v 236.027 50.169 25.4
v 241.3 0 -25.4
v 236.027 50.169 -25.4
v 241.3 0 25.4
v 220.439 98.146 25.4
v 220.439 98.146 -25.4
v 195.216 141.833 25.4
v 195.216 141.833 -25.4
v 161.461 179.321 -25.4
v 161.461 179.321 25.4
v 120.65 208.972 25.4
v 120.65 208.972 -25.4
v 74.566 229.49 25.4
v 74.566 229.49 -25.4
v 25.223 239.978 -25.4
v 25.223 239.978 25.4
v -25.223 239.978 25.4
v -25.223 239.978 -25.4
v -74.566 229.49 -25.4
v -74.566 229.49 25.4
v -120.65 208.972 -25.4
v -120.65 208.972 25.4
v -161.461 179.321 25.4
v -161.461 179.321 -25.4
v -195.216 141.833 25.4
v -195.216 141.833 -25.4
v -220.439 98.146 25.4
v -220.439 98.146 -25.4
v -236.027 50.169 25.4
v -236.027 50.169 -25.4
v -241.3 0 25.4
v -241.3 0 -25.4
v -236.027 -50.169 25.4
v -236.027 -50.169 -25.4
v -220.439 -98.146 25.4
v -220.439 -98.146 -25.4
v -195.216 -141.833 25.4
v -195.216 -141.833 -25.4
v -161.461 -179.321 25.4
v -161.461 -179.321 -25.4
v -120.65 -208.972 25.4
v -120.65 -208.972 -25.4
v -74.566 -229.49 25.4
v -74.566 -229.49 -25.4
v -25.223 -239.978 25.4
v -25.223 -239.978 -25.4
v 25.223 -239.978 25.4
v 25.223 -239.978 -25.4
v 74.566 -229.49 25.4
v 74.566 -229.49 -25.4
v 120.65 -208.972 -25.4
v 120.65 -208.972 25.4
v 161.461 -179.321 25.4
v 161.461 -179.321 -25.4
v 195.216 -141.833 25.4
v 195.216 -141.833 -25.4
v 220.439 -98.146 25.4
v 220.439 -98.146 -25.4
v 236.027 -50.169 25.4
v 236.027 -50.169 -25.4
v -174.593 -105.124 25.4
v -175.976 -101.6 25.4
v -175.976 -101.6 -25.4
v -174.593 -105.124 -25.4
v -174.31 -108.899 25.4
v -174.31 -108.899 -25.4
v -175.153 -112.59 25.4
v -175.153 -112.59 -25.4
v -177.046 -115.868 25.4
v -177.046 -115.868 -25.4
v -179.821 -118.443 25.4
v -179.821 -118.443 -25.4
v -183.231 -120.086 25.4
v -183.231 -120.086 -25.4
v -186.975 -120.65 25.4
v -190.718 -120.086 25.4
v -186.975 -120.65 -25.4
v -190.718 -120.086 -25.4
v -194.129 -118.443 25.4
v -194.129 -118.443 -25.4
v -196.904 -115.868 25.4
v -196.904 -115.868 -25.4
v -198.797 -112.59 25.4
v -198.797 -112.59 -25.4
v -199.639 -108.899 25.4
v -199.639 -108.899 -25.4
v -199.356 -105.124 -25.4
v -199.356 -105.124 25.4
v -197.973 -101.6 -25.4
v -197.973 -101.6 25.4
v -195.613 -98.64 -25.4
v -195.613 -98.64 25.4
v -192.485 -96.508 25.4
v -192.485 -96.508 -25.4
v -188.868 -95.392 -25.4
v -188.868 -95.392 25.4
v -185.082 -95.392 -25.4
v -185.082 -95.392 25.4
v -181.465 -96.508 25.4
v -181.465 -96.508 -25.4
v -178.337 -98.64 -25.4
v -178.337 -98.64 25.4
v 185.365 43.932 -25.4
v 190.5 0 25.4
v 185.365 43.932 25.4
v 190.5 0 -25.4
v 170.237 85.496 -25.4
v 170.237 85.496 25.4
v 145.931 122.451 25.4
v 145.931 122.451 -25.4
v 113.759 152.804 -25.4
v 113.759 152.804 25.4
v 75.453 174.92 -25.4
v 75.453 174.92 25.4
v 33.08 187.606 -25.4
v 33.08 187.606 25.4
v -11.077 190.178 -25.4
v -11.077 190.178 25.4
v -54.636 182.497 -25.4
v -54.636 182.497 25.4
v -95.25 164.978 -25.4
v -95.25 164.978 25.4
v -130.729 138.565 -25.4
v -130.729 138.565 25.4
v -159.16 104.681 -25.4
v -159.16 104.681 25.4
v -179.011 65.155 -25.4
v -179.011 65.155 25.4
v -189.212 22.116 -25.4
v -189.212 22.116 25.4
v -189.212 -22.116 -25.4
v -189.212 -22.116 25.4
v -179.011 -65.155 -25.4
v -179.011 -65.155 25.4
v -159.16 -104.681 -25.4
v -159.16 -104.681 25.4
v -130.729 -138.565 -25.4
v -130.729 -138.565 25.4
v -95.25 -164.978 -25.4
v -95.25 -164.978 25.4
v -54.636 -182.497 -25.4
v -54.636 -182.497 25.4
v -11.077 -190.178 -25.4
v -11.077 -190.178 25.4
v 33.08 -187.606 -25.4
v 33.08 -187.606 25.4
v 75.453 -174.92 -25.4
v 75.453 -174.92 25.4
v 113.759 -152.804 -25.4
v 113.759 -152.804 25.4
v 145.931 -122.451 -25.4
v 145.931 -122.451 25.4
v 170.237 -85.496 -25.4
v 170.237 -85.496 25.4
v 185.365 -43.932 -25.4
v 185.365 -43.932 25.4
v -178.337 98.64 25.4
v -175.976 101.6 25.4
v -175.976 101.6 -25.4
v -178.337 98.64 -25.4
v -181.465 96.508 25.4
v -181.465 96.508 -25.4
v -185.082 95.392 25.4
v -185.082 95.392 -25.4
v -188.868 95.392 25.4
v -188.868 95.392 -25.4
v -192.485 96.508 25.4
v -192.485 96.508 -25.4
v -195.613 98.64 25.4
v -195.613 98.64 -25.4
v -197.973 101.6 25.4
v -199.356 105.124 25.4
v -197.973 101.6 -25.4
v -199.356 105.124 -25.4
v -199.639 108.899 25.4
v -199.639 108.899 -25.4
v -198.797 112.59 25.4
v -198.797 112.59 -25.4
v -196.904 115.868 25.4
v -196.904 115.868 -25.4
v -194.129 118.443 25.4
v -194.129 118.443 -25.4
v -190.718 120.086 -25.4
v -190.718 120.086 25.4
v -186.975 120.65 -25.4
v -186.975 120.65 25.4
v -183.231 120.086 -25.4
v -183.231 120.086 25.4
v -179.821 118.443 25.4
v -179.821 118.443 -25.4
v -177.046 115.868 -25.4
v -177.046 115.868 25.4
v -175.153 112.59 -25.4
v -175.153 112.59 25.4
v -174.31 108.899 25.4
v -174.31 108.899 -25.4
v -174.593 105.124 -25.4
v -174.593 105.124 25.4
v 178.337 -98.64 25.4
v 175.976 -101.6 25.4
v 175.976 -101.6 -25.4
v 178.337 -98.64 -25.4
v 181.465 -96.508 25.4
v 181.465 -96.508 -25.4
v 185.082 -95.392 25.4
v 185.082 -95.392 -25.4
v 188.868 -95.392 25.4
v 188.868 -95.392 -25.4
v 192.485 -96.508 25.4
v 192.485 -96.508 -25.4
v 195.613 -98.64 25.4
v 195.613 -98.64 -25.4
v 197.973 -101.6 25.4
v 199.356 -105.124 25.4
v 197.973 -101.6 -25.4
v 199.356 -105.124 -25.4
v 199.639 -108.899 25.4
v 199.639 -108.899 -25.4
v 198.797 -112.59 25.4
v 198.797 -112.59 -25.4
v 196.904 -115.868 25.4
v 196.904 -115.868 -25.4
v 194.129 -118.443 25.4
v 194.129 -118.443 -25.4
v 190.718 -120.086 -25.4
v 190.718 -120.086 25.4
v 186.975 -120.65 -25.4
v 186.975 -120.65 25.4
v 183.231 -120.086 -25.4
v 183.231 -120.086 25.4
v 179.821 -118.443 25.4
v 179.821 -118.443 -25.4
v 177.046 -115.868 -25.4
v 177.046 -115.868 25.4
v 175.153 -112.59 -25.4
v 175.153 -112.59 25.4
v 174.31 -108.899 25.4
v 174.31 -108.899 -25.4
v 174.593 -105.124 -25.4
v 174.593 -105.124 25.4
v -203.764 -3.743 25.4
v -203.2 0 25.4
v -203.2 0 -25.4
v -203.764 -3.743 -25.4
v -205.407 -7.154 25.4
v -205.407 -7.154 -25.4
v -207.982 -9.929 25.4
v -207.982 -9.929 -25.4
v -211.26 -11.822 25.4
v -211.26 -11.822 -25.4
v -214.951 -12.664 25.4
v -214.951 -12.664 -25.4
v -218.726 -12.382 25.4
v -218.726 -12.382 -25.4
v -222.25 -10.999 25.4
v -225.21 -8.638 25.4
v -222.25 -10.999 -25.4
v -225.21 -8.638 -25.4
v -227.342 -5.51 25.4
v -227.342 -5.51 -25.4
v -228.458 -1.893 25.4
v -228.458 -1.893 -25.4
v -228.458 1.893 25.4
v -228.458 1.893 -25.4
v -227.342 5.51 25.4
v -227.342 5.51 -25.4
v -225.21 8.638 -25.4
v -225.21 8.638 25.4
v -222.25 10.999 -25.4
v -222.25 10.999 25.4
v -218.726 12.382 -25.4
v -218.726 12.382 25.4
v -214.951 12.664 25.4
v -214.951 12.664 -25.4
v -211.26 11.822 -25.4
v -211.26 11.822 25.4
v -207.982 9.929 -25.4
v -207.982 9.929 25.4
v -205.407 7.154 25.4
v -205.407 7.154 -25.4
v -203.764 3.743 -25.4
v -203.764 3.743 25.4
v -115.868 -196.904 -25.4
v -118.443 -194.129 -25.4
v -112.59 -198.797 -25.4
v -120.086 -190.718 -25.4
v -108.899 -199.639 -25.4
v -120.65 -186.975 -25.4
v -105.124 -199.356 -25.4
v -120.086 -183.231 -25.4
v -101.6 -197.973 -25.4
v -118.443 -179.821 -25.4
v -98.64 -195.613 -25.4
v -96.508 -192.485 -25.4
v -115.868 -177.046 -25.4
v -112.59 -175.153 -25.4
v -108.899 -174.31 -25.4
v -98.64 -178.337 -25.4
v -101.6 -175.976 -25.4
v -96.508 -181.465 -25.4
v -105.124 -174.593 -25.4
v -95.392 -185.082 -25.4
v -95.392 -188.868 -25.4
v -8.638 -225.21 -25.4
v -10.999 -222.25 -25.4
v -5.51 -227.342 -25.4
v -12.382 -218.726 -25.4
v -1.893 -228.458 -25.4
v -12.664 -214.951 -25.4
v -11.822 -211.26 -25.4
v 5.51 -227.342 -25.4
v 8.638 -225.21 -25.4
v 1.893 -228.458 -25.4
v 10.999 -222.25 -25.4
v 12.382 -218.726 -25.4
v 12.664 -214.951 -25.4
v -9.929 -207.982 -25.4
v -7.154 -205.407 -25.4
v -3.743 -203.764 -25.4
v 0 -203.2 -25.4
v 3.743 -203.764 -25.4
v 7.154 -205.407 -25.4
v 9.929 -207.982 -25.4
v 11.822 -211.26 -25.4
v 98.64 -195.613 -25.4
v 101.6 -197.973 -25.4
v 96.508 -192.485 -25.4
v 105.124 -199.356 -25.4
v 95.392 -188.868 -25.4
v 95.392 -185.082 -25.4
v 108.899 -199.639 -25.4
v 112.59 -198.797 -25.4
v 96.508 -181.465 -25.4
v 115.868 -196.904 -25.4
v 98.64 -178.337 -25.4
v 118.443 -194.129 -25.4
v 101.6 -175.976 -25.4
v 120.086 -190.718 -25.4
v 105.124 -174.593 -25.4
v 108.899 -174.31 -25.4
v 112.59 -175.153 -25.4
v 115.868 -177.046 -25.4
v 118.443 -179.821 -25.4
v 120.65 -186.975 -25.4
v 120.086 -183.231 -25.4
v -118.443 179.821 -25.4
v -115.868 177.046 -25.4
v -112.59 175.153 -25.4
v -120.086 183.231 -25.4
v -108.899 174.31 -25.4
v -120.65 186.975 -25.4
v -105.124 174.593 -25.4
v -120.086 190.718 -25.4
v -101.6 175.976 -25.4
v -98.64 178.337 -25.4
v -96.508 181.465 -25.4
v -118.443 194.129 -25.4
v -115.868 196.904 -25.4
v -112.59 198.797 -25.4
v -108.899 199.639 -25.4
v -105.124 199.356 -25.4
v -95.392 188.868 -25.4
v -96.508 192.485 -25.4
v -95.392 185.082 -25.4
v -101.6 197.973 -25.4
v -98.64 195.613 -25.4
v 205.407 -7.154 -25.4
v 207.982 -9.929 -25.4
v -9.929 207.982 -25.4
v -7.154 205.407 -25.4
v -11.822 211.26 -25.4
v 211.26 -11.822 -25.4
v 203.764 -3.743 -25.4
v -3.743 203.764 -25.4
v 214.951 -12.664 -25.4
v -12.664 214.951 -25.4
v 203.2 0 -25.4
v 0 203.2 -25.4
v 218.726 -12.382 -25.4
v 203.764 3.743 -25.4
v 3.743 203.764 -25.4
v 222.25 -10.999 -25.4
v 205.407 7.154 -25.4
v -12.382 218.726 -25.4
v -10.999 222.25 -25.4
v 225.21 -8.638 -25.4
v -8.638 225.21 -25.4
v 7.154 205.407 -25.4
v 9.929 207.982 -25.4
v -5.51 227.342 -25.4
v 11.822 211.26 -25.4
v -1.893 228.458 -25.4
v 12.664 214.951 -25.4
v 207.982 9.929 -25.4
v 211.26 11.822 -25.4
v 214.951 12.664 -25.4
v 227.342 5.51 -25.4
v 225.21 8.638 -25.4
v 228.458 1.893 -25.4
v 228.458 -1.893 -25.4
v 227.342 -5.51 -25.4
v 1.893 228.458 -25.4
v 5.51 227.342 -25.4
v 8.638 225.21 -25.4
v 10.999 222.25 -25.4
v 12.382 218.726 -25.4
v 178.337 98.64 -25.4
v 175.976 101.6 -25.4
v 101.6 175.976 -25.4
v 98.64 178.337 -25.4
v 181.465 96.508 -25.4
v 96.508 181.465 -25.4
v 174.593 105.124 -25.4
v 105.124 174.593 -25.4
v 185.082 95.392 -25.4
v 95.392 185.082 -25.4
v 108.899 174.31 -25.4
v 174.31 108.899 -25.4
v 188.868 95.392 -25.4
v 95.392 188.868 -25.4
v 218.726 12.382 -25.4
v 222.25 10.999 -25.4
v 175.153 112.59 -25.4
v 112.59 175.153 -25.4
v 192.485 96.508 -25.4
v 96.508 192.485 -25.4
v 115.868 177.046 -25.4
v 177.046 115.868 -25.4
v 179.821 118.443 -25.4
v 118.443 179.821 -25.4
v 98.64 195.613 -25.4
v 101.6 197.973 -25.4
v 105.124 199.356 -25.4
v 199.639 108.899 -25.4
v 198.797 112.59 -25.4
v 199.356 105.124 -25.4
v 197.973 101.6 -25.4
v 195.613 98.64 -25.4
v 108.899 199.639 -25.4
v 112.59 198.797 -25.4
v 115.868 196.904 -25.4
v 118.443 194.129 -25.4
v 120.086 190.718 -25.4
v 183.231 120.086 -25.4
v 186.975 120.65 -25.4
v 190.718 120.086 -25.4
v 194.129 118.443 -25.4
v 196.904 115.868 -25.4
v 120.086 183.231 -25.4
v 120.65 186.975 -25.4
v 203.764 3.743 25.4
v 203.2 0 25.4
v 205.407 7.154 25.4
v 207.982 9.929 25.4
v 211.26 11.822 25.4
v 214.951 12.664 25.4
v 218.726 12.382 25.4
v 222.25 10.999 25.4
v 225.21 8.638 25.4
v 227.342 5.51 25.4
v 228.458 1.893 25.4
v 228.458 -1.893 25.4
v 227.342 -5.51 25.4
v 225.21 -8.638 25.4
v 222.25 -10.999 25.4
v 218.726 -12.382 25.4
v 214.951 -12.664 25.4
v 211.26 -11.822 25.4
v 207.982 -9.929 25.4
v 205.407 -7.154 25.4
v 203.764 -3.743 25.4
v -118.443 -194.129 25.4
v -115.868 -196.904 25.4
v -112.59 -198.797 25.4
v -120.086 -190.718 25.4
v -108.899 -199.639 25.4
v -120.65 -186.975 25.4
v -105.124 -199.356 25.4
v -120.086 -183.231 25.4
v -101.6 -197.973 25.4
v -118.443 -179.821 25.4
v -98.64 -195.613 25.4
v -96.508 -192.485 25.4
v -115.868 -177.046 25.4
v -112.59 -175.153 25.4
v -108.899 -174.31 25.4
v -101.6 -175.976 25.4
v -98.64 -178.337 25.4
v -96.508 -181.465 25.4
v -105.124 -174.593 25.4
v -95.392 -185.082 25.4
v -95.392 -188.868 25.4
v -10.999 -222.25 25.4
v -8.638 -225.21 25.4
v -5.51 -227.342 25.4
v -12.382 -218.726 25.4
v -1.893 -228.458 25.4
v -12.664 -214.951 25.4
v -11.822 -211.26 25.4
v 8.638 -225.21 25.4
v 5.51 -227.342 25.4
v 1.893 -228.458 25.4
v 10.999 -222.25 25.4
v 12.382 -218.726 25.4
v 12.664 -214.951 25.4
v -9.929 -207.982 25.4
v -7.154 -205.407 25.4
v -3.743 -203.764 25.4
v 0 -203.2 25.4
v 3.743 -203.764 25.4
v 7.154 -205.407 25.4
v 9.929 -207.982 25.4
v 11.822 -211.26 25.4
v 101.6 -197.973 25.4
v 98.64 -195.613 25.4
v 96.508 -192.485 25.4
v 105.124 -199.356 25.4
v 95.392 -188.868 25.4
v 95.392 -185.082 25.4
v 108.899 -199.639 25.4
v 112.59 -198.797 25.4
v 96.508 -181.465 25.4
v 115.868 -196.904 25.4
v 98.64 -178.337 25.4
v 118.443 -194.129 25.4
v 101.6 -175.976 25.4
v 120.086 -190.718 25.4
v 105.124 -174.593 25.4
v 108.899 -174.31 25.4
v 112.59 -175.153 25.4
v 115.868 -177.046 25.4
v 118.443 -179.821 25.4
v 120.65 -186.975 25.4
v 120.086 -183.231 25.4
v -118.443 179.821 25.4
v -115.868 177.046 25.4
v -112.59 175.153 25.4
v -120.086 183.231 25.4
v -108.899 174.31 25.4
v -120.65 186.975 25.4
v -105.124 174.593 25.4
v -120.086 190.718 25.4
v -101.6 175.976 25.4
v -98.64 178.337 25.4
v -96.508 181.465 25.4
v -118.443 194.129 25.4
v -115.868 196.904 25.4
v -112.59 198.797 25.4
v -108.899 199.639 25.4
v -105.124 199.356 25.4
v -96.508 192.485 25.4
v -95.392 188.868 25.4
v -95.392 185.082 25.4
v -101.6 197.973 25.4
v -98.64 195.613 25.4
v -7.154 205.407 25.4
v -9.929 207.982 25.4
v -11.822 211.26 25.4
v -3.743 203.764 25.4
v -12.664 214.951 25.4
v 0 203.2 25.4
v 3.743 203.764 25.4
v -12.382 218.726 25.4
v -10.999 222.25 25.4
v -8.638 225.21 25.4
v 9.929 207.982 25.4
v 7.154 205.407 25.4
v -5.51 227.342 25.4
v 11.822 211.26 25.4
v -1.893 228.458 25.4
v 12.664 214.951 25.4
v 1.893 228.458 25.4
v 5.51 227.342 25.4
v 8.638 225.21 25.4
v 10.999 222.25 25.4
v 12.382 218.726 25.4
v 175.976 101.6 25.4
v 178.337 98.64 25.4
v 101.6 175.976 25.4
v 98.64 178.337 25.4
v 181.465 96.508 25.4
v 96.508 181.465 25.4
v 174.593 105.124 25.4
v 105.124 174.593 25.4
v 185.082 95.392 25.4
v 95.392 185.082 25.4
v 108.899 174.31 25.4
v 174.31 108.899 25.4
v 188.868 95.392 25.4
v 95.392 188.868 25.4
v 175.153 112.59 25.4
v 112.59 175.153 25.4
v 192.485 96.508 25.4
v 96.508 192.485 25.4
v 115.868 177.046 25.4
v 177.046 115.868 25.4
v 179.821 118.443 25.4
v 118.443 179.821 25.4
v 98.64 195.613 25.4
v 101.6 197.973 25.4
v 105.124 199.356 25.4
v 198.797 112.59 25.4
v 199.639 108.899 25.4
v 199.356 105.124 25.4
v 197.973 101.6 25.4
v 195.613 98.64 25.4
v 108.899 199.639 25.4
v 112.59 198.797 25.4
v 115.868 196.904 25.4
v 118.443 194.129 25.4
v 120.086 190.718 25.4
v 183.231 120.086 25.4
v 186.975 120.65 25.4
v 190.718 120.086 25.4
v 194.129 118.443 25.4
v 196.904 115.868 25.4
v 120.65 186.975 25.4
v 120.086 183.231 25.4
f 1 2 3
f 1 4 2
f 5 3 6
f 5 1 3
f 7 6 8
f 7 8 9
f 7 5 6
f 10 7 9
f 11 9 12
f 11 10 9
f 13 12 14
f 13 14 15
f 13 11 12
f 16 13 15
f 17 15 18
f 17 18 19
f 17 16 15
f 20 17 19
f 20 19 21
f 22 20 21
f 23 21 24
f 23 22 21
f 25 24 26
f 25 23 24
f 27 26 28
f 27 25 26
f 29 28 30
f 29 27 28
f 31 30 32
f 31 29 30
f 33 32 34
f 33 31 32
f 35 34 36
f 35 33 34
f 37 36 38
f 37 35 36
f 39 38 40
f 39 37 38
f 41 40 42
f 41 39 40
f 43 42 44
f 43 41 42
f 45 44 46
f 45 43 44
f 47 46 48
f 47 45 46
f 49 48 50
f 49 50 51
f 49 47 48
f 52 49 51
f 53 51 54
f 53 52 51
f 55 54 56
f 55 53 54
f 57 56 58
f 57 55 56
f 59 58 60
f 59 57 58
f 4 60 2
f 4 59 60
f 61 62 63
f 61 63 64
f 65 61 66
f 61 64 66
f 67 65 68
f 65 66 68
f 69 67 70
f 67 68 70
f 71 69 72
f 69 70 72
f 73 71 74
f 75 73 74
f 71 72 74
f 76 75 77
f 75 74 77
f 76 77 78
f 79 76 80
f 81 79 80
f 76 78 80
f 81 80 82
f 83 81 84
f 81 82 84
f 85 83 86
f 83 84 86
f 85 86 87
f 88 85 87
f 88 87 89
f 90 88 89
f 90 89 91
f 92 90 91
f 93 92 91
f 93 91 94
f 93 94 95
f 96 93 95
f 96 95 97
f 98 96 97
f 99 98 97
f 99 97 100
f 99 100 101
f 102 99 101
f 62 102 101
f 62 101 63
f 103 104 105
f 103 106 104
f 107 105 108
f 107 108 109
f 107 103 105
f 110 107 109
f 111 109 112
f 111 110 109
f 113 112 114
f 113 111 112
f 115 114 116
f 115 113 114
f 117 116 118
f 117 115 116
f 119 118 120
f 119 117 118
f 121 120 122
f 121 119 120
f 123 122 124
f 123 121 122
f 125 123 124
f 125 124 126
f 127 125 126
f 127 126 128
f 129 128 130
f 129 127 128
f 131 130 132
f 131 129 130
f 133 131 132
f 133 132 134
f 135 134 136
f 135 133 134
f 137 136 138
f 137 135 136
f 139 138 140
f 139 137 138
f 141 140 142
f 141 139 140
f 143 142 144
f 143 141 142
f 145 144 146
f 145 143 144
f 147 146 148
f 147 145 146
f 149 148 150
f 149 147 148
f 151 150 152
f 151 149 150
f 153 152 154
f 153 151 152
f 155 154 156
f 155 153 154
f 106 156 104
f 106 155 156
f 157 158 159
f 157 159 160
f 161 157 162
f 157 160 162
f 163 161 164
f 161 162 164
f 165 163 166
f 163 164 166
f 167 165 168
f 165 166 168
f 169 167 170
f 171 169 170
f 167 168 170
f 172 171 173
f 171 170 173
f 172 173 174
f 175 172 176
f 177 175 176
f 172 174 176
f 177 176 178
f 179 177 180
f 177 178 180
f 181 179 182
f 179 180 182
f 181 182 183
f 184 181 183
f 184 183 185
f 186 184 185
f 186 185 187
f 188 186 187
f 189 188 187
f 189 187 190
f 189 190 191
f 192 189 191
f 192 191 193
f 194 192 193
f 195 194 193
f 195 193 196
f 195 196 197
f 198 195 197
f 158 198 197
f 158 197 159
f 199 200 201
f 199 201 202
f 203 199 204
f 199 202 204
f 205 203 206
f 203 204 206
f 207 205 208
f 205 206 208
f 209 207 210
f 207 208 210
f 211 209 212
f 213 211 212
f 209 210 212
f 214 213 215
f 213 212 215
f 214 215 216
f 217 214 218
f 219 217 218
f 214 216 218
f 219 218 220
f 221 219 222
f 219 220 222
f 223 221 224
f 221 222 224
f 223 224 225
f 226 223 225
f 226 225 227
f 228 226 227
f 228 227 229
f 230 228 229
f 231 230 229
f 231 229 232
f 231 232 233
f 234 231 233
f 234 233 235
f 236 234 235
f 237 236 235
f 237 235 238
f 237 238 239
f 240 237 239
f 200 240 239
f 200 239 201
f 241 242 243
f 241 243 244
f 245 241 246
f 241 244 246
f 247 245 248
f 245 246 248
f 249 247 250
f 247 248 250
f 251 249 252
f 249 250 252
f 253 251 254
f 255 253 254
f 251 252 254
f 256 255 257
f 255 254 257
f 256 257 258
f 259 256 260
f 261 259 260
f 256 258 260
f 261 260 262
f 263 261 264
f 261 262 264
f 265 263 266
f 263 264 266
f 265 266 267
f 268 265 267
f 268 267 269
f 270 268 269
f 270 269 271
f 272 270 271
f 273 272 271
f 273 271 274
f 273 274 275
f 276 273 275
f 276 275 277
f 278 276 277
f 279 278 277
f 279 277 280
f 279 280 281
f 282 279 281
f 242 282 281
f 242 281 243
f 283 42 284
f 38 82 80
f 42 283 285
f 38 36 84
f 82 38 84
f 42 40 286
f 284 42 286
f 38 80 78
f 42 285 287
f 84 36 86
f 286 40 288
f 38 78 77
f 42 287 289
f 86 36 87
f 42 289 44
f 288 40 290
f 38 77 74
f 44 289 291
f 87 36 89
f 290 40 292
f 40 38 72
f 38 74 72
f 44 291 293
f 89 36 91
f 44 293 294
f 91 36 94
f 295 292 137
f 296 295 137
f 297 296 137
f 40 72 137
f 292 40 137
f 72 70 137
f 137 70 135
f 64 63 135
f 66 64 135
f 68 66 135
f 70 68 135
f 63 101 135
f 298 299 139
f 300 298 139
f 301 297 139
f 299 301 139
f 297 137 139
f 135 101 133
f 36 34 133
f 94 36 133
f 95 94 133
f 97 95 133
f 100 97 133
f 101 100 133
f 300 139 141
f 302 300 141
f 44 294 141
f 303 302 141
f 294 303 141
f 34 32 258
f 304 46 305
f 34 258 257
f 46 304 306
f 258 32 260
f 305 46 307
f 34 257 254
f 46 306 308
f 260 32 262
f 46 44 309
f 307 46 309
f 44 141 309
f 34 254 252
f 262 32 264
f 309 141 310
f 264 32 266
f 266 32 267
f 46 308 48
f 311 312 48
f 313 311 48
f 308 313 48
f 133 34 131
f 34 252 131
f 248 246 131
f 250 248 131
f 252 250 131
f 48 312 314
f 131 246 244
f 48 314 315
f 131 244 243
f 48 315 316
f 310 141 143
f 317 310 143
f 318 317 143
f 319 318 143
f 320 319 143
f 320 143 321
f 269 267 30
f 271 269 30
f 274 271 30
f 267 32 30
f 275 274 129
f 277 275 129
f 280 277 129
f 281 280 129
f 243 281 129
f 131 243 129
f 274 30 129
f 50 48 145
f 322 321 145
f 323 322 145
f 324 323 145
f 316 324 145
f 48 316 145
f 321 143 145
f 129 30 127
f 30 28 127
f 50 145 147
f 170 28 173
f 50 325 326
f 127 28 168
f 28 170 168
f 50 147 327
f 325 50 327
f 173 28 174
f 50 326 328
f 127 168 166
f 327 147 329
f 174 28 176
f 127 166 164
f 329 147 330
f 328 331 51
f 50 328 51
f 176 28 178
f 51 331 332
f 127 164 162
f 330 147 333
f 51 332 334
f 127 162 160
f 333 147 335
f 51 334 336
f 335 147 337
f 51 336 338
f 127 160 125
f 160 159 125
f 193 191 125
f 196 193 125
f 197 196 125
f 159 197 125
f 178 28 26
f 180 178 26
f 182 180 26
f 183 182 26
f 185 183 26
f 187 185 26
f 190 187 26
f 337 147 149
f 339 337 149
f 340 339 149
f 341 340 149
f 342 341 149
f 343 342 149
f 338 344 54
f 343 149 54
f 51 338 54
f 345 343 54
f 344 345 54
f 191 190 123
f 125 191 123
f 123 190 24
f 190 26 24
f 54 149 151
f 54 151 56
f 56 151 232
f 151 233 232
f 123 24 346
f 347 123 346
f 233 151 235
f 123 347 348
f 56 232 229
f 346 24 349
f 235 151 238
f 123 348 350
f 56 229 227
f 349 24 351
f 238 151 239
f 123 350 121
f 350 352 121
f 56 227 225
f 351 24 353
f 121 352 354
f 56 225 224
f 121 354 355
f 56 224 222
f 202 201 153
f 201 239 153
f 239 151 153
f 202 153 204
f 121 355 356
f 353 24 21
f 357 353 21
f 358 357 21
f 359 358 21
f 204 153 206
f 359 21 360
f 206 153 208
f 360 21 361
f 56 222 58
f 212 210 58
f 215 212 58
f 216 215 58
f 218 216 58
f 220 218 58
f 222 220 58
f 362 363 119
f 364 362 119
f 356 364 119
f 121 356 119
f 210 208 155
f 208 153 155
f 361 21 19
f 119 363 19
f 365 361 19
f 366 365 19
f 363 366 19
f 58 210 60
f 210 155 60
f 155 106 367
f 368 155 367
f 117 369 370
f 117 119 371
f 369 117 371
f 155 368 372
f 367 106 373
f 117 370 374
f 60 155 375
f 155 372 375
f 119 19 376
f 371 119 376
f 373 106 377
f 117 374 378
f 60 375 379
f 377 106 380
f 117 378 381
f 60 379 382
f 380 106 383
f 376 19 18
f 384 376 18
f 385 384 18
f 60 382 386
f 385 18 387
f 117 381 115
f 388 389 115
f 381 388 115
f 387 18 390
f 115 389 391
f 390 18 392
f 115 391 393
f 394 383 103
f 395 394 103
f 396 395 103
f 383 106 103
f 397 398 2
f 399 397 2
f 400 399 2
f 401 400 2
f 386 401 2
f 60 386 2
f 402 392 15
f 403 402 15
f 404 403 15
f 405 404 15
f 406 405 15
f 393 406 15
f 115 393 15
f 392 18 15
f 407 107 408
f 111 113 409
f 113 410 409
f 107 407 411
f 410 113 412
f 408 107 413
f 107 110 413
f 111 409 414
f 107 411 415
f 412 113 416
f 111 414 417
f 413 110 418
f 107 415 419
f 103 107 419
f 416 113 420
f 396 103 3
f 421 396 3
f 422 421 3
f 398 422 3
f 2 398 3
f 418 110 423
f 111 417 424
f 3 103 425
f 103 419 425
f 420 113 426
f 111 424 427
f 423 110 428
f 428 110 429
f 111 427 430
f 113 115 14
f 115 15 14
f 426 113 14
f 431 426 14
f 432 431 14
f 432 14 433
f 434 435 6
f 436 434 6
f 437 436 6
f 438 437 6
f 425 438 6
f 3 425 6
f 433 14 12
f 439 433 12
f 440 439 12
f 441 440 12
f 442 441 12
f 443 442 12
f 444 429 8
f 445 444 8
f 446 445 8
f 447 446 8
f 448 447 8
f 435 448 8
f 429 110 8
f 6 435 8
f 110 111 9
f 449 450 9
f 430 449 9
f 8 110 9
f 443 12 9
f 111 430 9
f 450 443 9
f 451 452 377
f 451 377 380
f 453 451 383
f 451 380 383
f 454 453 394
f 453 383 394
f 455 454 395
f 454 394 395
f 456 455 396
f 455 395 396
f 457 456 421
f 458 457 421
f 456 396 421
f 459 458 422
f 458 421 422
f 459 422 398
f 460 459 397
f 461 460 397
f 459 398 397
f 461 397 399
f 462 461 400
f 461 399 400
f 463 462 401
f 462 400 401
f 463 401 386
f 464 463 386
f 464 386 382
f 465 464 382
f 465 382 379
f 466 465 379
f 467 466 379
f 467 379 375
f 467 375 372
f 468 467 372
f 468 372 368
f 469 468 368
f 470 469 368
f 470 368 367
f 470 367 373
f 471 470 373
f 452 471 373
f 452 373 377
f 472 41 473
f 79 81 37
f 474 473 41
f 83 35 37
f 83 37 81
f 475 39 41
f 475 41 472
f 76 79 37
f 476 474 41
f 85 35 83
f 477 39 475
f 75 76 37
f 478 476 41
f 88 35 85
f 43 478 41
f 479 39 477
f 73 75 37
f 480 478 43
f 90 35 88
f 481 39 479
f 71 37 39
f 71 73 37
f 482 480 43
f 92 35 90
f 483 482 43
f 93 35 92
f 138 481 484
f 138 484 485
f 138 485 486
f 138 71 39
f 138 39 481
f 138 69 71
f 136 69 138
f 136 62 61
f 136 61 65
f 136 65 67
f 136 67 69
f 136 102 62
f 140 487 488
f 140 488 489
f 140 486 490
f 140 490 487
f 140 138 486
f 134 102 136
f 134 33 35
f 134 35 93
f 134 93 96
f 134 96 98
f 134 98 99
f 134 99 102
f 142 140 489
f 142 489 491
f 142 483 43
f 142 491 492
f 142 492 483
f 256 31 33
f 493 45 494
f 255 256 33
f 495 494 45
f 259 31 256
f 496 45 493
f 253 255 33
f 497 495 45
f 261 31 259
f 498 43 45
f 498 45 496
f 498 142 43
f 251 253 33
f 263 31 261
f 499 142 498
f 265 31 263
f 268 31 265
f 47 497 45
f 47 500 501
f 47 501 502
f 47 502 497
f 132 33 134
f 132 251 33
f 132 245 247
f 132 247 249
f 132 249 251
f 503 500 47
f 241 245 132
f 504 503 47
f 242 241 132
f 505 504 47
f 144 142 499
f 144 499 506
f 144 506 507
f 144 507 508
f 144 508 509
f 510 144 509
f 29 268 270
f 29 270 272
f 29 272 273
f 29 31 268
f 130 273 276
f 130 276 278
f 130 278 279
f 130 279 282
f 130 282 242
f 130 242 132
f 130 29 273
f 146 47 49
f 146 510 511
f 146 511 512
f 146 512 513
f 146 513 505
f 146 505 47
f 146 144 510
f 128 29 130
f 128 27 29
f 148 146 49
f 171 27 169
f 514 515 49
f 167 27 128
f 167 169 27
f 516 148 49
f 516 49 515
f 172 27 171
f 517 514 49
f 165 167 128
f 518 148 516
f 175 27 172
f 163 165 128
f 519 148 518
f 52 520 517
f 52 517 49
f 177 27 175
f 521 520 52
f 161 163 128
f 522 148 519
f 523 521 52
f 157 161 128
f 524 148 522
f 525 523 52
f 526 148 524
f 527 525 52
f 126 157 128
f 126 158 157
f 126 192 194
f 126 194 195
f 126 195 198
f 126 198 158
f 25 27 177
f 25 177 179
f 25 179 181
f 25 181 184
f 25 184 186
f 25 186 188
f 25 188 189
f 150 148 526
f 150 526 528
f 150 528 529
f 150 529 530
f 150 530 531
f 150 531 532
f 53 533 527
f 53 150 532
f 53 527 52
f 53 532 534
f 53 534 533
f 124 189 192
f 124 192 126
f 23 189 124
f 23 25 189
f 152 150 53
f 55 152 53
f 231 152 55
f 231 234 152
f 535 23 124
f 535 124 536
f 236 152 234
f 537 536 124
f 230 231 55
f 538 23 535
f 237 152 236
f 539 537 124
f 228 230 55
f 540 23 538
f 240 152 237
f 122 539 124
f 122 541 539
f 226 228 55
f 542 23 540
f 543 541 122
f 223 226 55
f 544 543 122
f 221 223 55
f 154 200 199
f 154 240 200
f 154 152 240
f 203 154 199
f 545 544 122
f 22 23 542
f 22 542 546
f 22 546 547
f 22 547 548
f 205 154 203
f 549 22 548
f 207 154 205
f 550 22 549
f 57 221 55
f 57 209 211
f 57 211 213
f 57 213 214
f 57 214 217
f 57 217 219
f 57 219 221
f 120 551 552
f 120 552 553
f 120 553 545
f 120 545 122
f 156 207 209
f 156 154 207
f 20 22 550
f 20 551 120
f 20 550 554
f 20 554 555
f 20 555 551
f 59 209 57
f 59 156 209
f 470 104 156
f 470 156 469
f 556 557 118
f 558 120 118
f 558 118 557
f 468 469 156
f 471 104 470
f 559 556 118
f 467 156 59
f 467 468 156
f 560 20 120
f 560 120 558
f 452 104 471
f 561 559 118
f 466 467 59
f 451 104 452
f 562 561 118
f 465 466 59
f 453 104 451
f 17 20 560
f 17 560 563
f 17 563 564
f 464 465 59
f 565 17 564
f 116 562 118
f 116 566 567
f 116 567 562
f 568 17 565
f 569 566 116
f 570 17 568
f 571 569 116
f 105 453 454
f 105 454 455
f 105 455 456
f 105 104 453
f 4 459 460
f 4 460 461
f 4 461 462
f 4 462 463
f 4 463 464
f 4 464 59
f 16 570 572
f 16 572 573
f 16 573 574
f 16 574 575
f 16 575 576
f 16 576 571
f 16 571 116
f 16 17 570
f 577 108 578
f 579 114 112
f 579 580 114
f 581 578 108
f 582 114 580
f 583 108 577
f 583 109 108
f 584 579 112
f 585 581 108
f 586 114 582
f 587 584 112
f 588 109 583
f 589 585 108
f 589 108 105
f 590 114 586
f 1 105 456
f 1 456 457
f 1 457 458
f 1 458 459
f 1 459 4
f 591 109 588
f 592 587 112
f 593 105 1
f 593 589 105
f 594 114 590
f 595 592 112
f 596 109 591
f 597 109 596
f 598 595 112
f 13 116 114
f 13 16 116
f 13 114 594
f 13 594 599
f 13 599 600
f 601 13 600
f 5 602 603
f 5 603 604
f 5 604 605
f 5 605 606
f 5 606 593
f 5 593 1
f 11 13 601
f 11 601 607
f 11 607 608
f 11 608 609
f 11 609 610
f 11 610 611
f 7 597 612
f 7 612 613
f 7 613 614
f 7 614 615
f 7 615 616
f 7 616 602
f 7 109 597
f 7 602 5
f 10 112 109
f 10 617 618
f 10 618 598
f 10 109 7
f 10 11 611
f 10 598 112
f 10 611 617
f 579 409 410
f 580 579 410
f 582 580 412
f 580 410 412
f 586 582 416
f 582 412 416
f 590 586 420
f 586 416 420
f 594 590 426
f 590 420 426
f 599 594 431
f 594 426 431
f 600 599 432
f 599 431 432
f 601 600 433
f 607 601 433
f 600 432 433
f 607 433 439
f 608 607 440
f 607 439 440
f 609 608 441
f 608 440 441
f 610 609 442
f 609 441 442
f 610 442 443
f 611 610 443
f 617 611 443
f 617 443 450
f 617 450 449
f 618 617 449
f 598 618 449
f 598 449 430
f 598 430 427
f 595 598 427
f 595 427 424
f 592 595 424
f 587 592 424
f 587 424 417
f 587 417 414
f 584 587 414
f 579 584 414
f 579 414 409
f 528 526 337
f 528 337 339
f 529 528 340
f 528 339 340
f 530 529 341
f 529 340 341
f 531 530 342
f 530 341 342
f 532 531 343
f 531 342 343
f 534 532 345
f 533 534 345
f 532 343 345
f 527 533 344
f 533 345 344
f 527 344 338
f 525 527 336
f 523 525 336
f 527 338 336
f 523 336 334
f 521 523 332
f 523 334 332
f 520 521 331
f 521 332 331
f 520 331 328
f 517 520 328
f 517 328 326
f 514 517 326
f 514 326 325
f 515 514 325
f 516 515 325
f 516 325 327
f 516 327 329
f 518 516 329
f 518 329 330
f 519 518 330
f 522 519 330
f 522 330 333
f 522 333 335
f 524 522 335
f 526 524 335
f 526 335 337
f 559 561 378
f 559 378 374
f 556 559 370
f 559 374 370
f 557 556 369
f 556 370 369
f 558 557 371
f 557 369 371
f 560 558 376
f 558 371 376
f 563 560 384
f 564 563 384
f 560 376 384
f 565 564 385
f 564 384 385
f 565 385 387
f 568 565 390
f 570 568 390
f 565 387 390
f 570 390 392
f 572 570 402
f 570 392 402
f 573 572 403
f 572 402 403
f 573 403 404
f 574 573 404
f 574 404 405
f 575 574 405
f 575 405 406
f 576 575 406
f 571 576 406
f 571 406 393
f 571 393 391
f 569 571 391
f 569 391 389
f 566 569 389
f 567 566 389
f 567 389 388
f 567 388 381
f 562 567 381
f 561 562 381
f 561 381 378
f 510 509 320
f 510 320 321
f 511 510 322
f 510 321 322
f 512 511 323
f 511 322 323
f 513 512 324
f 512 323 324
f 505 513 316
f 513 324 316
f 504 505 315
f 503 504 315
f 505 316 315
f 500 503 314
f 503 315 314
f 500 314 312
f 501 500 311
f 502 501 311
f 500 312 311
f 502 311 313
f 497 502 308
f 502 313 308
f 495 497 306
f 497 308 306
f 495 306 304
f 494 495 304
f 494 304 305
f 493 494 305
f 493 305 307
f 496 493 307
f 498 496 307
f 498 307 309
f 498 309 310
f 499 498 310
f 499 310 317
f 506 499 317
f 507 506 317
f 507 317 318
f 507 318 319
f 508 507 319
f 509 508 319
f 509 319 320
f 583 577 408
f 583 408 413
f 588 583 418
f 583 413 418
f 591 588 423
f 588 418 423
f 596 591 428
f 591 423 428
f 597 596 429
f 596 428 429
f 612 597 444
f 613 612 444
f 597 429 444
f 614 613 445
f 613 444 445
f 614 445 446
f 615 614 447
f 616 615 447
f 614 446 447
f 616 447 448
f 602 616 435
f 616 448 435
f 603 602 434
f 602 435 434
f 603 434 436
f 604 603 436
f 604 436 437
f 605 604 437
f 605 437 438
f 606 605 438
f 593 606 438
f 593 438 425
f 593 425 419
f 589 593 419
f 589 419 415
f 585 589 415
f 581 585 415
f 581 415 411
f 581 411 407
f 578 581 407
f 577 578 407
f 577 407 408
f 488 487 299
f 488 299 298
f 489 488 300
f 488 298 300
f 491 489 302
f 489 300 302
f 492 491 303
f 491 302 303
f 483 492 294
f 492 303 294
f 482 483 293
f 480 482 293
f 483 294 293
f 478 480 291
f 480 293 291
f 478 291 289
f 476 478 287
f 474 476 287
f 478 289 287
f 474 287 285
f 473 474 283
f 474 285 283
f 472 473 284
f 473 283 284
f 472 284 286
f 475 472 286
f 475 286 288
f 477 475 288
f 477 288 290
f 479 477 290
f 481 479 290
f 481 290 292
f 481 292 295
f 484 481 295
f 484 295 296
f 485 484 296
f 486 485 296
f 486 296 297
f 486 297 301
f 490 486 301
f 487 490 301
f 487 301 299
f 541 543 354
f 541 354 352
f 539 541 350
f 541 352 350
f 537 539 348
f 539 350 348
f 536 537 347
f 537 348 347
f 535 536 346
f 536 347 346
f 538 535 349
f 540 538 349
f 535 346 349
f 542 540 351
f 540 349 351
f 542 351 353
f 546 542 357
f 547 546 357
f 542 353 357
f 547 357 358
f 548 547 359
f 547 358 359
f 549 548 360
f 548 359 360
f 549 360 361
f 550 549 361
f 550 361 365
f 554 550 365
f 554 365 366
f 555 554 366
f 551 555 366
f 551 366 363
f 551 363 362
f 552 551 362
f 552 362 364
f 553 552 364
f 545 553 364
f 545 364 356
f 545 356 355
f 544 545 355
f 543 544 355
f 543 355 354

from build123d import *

# Parameters (mm, degrees)
SKETCH1_R              = 241.3
SKETCH1_R_2            = 190.5
BOSS_EXTRUDE1_DEPTH    = 25.4
F_1_1_DIAMETER_HOLE1_D = 25.4
CIRPATTERN1_COUNT      = 12


with BuildPart() as part:
    # Sketch1 → Boss-Extrude1 (new body, symmetric)
    with BuildSketch(Plane.XY):
        Circle(SKETCH1_R)
        Circle(SKETCH1_R_2, mode=Mode.SUBTRACT)
    extrude(amount=BOSS_EXTRUDE1_DEPTH, both=True)

    # 1 (1) Diameter Hole1 (through all)
    with Locations(Plane.XY.offset(25.4)):
        with Locations((215.9, 0)):
            f_1_1_diameter_hole1 = Hole(F_1_1_DIAMETER_HOLE1_D / 2)

    # CirPattern1: 1 (1) Diameter Hole1 ×12 about axis
    cirpattern1_axis = Axis((0, 0, 0), (0, 0, 1))
    for i in range(1, CIRPATTERN1_COUNT):
        add(f_1_1_diameter_hole1.rotate(cirpattern1_axis, i * 360 / CIRPATTERN1_COUNT), mode=Mode.SUBTRACT)


solid = part.part
